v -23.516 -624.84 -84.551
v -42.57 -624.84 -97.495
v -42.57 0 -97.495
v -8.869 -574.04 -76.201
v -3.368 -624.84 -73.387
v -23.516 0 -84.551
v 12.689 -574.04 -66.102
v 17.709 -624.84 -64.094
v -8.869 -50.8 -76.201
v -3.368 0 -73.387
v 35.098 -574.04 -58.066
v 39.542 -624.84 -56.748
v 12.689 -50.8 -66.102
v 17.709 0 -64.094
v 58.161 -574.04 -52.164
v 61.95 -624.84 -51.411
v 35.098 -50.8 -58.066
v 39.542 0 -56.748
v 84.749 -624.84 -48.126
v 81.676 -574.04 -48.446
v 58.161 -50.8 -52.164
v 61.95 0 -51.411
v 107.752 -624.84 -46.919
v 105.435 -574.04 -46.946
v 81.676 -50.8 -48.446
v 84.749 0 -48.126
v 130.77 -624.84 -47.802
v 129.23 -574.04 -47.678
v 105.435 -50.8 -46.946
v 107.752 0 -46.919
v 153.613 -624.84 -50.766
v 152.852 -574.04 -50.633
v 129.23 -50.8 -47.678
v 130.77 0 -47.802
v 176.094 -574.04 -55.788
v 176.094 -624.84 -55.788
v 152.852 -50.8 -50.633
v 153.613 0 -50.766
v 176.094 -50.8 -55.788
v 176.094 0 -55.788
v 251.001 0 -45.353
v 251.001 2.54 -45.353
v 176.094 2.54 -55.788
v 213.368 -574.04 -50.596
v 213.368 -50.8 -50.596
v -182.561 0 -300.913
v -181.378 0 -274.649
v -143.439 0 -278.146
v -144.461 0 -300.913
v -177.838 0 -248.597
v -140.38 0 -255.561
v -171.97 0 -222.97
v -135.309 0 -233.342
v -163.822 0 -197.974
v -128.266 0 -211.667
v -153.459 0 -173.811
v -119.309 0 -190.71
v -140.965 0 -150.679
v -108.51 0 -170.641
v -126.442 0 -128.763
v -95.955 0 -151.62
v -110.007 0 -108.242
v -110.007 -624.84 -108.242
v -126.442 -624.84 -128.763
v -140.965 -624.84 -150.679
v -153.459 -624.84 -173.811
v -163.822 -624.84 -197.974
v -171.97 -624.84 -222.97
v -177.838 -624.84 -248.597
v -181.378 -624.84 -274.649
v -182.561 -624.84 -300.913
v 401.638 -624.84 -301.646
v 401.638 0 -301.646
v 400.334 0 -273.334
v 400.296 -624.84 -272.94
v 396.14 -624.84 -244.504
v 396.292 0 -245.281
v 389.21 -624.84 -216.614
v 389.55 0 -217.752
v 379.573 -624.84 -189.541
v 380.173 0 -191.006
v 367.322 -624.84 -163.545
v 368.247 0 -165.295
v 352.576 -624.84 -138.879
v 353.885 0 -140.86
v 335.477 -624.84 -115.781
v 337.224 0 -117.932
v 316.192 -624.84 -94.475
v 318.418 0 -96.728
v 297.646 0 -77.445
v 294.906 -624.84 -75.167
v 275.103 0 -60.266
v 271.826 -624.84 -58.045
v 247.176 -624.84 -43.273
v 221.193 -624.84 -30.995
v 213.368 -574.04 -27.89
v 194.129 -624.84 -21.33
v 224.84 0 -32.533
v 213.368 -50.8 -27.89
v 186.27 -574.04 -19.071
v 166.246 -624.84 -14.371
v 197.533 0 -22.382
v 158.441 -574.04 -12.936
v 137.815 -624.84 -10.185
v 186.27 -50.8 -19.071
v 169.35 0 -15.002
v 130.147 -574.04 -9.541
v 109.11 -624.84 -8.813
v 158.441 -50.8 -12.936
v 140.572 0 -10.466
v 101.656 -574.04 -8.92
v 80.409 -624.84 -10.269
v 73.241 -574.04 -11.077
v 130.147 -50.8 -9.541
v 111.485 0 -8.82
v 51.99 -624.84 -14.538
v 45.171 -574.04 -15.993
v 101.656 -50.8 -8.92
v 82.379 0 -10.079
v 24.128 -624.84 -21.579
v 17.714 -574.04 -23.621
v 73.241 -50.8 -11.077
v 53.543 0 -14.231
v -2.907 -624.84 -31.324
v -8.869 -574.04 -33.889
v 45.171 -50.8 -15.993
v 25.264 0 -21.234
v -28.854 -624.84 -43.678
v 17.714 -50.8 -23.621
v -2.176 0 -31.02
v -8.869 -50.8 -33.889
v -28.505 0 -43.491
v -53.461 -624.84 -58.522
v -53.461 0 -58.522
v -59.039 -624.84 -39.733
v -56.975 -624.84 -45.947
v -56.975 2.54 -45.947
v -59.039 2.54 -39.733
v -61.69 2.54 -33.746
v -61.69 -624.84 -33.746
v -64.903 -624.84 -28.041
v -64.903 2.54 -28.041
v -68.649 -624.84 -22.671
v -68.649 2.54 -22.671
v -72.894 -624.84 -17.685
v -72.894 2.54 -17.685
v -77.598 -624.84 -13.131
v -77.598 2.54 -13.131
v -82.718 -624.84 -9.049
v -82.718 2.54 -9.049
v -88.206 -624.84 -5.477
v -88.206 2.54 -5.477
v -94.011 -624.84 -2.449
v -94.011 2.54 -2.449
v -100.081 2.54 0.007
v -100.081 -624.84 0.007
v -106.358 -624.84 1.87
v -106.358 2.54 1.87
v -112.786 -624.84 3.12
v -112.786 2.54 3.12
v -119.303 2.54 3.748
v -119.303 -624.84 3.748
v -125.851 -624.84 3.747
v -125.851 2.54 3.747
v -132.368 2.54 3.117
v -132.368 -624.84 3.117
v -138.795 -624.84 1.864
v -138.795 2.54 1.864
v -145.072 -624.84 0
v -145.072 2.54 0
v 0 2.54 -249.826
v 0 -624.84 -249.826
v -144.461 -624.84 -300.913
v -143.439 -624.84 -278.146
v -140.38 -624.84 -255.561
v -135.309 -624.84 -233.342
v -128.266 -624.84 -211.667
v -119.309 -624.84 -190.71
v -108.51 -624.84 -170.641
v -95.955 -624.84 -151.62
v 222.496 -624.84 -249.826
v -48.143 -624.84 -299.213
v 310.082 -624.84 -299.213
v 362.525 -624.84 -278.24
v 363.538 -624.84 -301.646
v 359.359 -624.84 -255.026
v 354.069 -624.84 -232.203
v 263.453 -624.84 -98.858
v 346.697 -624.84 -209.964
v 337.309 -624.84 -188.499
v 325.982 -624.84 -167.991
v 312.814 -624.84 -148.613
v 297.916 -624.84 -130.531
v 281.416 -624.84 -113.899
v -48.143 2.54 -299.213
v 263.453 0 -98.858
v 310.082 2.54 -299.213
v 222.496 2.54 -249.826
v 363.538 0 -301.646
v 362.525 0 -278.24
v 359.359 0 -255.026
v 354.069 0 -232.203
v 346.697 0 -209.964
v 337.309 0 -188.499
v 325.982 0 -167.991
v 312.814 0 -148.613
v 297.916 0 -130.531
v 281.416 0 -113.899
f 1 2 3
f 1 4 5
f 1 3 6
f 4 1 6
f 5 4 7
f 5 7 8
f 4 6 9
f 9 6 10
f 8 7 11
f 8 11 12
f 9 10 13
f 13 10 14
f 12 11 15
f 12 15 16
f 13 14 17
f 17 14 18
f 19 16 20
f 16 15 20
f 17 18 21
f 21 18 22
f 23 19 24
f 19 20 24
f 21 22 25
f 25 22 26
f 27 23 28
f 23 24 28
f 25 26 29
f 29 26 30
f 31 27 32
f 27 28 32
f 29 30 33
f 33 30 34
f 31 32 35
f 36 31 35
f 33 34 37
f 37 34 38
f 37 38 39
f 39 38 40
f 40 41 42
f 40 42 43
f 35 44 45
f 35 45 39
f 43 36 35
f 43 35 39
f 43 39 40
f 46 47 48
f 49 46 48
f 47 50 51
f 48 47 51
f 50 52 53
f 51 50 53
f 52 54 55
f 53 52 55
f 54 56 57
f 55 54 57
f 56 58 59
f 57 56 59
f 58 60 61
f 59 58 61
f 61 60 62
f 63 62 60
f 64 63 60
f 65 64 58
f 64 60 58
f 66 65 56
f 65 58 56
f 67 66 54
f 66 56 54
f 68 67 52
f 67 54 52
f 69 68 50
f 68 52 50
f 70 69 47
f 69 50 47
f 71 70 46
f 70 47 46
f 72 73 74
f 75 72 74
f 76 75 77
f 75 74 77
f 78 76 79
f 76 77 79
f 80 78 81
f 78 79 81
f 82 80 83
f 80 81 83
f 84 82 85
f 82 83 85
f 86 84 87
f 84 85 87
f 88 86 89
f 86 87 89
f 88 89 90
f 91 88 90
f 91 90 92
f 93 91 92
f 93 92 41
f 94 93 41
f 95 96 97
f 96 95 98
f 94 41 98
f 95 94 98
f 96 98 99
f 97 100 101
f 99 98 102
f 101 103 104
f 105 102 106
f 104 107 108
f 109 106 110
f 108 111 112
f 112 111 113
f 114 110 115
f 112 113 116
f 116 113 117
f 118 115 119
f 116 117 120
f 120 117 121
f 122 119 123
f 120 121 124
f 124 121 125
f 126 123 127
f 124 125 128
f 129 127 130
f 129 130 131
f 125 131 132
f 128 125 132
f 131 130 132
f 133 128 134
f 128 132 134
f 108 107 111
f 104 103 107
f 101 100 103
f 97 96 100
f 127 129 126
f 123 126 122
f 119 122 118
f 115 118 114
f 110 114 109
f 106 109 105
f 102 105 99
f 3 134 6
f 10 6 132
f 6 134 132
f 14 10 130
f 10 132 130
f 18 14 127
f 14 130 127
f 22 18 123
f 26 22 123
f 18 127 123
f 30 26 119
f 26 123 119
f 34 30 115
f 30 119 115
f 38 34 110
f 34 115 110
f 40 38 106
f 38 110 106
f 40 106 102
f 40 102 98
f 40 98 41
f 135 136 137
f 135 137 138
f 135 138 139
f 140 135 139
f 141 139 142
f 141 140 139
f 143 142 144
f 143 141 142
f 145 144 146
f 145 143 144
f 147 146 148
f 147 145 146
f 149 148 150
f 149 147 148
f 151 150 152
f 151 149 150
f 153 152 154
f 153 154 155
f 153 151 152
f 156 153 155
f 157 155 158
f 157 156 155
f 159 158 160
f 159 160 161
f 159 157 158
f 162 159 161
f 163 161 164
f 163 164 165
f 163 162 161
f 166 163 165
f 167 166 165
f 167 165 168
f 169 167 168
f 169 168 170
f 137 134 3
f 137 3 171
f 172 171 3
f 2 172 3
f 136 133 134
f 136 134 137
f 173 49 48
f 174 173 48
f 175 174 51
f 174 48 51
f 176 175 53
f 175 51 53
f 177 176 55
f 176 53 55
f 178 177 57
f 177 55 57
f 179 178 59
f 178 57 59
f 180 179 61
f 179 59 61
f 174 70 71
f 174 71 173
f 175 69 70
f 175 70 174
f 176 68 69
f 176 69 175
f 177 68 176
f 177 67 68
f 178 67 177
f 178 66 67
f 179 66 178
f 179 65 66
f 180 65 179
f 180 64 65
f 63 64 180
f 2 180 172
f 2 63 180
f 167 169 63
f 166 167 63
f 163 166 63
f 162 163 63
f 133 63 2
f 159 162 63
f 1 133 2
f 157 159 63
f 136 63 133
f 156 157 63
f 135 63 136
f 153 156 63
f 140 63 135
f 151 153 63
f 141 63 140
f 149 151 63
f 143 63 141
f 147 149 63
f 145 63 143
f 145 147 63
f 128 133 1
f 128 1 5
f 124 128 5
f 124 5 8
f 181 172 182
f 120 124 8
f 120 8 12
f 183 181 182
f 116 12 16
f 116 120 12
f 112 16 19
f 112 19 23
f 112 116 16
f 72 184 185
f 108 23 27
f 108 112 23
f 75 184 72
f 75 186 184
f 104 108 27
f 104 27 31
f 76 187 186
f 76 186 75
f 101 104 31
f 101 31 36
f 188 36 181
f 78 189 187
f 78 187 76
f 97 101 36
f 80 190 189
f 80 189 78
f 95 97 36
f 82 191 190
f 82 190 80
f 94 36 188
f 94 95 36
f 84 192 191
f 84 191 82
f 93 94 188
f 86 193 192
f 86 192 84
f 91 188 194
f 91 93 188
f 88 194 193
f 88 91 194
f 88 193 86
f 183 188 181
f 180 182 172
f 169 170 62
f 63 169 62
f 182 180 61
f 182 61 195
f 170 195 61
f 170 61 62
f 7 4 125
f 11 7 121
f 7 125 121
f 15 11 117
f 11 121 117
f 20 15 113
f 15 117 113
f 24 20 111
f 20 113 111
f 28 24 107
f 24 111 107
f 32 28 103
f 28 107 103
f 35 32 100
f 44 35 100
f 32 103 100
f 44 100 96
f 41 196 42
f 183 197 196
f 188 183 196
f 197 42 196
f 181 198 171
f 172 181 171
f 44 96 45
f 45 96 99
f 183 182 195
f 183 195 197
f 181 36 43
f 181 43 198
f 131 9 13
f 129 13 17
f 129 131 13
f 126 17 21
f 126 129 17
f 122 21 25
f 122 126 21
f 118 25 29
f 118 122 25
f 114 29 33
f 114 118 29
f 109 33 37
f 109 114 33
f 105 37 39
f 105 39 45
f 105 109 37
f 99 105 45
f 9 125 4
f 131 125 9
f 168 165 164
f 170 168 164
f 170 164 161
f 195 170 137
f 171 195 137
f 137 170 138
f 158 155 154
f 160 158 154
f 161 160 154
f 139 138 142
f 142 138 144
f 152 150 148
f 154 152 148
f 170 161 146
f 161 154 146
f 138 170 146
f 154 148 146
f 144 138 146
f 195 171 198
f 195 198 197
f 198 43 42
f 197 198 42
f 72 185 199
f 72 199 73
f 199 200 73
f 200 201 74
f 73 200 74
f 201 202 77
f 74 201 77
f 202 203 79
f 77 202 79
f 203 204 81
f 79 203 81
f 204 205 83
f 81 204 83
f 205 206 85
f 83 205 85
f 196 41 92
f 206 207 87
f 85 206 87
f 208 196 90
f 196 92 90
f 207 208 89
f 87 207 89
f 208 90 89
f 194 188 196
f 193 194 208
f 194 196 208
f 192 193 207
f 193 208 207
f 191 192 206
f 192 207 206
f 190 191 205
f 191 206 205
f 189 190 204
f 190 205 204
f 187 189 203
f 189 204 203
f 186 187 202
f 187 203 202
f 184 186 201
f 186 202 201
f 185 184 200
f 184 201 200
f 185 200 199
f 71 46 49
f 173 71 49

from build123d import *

# Parameters (mm, degrees)
F1_DEPTH = 624.84
F3_W     = 222.237472
F3_H     = 523.24
F4_DEPTH = 99.06
F5_DEPTH = 627.38


with BuildPart() as f1:
    # F0 (on Front) → F1 (new body)
    with BuildSketch(Plane.XZ):
        with BuildLine():
            Line((363.537534, -301.646389), (401.637534, -301.646389))
            ThreePointArc((401.637534, -301.646389), (109.905185, -8.813365), (-182.561408, -300.913066))
            Line((-182.561408, -300.913066), (-144.461408, -300.913066))
            ThreePointArc((-144.461408, -300.913066), (109.905254, -46.913399), (363.537534, -301.646389))
        make_face()
    extrude(amount=F1_DEPTH)

    # F3 (on Top) → F4 (cut)
    with BuildSketch(Plane.XY):
        with Locations((102.249414, -312.42)):
            Rectangle(F3_W, F3_H)
    extrude(amount=-F4_DEPTH, mode=Mode.SUBTRACT)

    # F2 (on face) → F5 (join)
    with BuildSketch(Plane.XZ.offset(624.84)):
        with BuildLine():
            Line((176.094062, -55.787923), (222.495884, -249.826312))
            Line((222.495884, -249.826312), (0, -249.826312))
            Line((0, -249.826312), (-56.975495, -45.947485))
            ThreePointArc((-56.975495, -45.947485), (-91.072153, -3.893234), (-145.072013, 0))
            Line((-145.072013, 0), (-48.143223, -299.213022))
            Line((-48.143223, -299.213022), (310.081872, -299.213022))
            Line((310.081872, -299.213022), (251.000916, -45.353364))
            Line((251.000916, -45.353364), (176.094062, -55.787923))
        make_face()
    extrude(amount=-F5_DEPTH)


solid = f1.part
